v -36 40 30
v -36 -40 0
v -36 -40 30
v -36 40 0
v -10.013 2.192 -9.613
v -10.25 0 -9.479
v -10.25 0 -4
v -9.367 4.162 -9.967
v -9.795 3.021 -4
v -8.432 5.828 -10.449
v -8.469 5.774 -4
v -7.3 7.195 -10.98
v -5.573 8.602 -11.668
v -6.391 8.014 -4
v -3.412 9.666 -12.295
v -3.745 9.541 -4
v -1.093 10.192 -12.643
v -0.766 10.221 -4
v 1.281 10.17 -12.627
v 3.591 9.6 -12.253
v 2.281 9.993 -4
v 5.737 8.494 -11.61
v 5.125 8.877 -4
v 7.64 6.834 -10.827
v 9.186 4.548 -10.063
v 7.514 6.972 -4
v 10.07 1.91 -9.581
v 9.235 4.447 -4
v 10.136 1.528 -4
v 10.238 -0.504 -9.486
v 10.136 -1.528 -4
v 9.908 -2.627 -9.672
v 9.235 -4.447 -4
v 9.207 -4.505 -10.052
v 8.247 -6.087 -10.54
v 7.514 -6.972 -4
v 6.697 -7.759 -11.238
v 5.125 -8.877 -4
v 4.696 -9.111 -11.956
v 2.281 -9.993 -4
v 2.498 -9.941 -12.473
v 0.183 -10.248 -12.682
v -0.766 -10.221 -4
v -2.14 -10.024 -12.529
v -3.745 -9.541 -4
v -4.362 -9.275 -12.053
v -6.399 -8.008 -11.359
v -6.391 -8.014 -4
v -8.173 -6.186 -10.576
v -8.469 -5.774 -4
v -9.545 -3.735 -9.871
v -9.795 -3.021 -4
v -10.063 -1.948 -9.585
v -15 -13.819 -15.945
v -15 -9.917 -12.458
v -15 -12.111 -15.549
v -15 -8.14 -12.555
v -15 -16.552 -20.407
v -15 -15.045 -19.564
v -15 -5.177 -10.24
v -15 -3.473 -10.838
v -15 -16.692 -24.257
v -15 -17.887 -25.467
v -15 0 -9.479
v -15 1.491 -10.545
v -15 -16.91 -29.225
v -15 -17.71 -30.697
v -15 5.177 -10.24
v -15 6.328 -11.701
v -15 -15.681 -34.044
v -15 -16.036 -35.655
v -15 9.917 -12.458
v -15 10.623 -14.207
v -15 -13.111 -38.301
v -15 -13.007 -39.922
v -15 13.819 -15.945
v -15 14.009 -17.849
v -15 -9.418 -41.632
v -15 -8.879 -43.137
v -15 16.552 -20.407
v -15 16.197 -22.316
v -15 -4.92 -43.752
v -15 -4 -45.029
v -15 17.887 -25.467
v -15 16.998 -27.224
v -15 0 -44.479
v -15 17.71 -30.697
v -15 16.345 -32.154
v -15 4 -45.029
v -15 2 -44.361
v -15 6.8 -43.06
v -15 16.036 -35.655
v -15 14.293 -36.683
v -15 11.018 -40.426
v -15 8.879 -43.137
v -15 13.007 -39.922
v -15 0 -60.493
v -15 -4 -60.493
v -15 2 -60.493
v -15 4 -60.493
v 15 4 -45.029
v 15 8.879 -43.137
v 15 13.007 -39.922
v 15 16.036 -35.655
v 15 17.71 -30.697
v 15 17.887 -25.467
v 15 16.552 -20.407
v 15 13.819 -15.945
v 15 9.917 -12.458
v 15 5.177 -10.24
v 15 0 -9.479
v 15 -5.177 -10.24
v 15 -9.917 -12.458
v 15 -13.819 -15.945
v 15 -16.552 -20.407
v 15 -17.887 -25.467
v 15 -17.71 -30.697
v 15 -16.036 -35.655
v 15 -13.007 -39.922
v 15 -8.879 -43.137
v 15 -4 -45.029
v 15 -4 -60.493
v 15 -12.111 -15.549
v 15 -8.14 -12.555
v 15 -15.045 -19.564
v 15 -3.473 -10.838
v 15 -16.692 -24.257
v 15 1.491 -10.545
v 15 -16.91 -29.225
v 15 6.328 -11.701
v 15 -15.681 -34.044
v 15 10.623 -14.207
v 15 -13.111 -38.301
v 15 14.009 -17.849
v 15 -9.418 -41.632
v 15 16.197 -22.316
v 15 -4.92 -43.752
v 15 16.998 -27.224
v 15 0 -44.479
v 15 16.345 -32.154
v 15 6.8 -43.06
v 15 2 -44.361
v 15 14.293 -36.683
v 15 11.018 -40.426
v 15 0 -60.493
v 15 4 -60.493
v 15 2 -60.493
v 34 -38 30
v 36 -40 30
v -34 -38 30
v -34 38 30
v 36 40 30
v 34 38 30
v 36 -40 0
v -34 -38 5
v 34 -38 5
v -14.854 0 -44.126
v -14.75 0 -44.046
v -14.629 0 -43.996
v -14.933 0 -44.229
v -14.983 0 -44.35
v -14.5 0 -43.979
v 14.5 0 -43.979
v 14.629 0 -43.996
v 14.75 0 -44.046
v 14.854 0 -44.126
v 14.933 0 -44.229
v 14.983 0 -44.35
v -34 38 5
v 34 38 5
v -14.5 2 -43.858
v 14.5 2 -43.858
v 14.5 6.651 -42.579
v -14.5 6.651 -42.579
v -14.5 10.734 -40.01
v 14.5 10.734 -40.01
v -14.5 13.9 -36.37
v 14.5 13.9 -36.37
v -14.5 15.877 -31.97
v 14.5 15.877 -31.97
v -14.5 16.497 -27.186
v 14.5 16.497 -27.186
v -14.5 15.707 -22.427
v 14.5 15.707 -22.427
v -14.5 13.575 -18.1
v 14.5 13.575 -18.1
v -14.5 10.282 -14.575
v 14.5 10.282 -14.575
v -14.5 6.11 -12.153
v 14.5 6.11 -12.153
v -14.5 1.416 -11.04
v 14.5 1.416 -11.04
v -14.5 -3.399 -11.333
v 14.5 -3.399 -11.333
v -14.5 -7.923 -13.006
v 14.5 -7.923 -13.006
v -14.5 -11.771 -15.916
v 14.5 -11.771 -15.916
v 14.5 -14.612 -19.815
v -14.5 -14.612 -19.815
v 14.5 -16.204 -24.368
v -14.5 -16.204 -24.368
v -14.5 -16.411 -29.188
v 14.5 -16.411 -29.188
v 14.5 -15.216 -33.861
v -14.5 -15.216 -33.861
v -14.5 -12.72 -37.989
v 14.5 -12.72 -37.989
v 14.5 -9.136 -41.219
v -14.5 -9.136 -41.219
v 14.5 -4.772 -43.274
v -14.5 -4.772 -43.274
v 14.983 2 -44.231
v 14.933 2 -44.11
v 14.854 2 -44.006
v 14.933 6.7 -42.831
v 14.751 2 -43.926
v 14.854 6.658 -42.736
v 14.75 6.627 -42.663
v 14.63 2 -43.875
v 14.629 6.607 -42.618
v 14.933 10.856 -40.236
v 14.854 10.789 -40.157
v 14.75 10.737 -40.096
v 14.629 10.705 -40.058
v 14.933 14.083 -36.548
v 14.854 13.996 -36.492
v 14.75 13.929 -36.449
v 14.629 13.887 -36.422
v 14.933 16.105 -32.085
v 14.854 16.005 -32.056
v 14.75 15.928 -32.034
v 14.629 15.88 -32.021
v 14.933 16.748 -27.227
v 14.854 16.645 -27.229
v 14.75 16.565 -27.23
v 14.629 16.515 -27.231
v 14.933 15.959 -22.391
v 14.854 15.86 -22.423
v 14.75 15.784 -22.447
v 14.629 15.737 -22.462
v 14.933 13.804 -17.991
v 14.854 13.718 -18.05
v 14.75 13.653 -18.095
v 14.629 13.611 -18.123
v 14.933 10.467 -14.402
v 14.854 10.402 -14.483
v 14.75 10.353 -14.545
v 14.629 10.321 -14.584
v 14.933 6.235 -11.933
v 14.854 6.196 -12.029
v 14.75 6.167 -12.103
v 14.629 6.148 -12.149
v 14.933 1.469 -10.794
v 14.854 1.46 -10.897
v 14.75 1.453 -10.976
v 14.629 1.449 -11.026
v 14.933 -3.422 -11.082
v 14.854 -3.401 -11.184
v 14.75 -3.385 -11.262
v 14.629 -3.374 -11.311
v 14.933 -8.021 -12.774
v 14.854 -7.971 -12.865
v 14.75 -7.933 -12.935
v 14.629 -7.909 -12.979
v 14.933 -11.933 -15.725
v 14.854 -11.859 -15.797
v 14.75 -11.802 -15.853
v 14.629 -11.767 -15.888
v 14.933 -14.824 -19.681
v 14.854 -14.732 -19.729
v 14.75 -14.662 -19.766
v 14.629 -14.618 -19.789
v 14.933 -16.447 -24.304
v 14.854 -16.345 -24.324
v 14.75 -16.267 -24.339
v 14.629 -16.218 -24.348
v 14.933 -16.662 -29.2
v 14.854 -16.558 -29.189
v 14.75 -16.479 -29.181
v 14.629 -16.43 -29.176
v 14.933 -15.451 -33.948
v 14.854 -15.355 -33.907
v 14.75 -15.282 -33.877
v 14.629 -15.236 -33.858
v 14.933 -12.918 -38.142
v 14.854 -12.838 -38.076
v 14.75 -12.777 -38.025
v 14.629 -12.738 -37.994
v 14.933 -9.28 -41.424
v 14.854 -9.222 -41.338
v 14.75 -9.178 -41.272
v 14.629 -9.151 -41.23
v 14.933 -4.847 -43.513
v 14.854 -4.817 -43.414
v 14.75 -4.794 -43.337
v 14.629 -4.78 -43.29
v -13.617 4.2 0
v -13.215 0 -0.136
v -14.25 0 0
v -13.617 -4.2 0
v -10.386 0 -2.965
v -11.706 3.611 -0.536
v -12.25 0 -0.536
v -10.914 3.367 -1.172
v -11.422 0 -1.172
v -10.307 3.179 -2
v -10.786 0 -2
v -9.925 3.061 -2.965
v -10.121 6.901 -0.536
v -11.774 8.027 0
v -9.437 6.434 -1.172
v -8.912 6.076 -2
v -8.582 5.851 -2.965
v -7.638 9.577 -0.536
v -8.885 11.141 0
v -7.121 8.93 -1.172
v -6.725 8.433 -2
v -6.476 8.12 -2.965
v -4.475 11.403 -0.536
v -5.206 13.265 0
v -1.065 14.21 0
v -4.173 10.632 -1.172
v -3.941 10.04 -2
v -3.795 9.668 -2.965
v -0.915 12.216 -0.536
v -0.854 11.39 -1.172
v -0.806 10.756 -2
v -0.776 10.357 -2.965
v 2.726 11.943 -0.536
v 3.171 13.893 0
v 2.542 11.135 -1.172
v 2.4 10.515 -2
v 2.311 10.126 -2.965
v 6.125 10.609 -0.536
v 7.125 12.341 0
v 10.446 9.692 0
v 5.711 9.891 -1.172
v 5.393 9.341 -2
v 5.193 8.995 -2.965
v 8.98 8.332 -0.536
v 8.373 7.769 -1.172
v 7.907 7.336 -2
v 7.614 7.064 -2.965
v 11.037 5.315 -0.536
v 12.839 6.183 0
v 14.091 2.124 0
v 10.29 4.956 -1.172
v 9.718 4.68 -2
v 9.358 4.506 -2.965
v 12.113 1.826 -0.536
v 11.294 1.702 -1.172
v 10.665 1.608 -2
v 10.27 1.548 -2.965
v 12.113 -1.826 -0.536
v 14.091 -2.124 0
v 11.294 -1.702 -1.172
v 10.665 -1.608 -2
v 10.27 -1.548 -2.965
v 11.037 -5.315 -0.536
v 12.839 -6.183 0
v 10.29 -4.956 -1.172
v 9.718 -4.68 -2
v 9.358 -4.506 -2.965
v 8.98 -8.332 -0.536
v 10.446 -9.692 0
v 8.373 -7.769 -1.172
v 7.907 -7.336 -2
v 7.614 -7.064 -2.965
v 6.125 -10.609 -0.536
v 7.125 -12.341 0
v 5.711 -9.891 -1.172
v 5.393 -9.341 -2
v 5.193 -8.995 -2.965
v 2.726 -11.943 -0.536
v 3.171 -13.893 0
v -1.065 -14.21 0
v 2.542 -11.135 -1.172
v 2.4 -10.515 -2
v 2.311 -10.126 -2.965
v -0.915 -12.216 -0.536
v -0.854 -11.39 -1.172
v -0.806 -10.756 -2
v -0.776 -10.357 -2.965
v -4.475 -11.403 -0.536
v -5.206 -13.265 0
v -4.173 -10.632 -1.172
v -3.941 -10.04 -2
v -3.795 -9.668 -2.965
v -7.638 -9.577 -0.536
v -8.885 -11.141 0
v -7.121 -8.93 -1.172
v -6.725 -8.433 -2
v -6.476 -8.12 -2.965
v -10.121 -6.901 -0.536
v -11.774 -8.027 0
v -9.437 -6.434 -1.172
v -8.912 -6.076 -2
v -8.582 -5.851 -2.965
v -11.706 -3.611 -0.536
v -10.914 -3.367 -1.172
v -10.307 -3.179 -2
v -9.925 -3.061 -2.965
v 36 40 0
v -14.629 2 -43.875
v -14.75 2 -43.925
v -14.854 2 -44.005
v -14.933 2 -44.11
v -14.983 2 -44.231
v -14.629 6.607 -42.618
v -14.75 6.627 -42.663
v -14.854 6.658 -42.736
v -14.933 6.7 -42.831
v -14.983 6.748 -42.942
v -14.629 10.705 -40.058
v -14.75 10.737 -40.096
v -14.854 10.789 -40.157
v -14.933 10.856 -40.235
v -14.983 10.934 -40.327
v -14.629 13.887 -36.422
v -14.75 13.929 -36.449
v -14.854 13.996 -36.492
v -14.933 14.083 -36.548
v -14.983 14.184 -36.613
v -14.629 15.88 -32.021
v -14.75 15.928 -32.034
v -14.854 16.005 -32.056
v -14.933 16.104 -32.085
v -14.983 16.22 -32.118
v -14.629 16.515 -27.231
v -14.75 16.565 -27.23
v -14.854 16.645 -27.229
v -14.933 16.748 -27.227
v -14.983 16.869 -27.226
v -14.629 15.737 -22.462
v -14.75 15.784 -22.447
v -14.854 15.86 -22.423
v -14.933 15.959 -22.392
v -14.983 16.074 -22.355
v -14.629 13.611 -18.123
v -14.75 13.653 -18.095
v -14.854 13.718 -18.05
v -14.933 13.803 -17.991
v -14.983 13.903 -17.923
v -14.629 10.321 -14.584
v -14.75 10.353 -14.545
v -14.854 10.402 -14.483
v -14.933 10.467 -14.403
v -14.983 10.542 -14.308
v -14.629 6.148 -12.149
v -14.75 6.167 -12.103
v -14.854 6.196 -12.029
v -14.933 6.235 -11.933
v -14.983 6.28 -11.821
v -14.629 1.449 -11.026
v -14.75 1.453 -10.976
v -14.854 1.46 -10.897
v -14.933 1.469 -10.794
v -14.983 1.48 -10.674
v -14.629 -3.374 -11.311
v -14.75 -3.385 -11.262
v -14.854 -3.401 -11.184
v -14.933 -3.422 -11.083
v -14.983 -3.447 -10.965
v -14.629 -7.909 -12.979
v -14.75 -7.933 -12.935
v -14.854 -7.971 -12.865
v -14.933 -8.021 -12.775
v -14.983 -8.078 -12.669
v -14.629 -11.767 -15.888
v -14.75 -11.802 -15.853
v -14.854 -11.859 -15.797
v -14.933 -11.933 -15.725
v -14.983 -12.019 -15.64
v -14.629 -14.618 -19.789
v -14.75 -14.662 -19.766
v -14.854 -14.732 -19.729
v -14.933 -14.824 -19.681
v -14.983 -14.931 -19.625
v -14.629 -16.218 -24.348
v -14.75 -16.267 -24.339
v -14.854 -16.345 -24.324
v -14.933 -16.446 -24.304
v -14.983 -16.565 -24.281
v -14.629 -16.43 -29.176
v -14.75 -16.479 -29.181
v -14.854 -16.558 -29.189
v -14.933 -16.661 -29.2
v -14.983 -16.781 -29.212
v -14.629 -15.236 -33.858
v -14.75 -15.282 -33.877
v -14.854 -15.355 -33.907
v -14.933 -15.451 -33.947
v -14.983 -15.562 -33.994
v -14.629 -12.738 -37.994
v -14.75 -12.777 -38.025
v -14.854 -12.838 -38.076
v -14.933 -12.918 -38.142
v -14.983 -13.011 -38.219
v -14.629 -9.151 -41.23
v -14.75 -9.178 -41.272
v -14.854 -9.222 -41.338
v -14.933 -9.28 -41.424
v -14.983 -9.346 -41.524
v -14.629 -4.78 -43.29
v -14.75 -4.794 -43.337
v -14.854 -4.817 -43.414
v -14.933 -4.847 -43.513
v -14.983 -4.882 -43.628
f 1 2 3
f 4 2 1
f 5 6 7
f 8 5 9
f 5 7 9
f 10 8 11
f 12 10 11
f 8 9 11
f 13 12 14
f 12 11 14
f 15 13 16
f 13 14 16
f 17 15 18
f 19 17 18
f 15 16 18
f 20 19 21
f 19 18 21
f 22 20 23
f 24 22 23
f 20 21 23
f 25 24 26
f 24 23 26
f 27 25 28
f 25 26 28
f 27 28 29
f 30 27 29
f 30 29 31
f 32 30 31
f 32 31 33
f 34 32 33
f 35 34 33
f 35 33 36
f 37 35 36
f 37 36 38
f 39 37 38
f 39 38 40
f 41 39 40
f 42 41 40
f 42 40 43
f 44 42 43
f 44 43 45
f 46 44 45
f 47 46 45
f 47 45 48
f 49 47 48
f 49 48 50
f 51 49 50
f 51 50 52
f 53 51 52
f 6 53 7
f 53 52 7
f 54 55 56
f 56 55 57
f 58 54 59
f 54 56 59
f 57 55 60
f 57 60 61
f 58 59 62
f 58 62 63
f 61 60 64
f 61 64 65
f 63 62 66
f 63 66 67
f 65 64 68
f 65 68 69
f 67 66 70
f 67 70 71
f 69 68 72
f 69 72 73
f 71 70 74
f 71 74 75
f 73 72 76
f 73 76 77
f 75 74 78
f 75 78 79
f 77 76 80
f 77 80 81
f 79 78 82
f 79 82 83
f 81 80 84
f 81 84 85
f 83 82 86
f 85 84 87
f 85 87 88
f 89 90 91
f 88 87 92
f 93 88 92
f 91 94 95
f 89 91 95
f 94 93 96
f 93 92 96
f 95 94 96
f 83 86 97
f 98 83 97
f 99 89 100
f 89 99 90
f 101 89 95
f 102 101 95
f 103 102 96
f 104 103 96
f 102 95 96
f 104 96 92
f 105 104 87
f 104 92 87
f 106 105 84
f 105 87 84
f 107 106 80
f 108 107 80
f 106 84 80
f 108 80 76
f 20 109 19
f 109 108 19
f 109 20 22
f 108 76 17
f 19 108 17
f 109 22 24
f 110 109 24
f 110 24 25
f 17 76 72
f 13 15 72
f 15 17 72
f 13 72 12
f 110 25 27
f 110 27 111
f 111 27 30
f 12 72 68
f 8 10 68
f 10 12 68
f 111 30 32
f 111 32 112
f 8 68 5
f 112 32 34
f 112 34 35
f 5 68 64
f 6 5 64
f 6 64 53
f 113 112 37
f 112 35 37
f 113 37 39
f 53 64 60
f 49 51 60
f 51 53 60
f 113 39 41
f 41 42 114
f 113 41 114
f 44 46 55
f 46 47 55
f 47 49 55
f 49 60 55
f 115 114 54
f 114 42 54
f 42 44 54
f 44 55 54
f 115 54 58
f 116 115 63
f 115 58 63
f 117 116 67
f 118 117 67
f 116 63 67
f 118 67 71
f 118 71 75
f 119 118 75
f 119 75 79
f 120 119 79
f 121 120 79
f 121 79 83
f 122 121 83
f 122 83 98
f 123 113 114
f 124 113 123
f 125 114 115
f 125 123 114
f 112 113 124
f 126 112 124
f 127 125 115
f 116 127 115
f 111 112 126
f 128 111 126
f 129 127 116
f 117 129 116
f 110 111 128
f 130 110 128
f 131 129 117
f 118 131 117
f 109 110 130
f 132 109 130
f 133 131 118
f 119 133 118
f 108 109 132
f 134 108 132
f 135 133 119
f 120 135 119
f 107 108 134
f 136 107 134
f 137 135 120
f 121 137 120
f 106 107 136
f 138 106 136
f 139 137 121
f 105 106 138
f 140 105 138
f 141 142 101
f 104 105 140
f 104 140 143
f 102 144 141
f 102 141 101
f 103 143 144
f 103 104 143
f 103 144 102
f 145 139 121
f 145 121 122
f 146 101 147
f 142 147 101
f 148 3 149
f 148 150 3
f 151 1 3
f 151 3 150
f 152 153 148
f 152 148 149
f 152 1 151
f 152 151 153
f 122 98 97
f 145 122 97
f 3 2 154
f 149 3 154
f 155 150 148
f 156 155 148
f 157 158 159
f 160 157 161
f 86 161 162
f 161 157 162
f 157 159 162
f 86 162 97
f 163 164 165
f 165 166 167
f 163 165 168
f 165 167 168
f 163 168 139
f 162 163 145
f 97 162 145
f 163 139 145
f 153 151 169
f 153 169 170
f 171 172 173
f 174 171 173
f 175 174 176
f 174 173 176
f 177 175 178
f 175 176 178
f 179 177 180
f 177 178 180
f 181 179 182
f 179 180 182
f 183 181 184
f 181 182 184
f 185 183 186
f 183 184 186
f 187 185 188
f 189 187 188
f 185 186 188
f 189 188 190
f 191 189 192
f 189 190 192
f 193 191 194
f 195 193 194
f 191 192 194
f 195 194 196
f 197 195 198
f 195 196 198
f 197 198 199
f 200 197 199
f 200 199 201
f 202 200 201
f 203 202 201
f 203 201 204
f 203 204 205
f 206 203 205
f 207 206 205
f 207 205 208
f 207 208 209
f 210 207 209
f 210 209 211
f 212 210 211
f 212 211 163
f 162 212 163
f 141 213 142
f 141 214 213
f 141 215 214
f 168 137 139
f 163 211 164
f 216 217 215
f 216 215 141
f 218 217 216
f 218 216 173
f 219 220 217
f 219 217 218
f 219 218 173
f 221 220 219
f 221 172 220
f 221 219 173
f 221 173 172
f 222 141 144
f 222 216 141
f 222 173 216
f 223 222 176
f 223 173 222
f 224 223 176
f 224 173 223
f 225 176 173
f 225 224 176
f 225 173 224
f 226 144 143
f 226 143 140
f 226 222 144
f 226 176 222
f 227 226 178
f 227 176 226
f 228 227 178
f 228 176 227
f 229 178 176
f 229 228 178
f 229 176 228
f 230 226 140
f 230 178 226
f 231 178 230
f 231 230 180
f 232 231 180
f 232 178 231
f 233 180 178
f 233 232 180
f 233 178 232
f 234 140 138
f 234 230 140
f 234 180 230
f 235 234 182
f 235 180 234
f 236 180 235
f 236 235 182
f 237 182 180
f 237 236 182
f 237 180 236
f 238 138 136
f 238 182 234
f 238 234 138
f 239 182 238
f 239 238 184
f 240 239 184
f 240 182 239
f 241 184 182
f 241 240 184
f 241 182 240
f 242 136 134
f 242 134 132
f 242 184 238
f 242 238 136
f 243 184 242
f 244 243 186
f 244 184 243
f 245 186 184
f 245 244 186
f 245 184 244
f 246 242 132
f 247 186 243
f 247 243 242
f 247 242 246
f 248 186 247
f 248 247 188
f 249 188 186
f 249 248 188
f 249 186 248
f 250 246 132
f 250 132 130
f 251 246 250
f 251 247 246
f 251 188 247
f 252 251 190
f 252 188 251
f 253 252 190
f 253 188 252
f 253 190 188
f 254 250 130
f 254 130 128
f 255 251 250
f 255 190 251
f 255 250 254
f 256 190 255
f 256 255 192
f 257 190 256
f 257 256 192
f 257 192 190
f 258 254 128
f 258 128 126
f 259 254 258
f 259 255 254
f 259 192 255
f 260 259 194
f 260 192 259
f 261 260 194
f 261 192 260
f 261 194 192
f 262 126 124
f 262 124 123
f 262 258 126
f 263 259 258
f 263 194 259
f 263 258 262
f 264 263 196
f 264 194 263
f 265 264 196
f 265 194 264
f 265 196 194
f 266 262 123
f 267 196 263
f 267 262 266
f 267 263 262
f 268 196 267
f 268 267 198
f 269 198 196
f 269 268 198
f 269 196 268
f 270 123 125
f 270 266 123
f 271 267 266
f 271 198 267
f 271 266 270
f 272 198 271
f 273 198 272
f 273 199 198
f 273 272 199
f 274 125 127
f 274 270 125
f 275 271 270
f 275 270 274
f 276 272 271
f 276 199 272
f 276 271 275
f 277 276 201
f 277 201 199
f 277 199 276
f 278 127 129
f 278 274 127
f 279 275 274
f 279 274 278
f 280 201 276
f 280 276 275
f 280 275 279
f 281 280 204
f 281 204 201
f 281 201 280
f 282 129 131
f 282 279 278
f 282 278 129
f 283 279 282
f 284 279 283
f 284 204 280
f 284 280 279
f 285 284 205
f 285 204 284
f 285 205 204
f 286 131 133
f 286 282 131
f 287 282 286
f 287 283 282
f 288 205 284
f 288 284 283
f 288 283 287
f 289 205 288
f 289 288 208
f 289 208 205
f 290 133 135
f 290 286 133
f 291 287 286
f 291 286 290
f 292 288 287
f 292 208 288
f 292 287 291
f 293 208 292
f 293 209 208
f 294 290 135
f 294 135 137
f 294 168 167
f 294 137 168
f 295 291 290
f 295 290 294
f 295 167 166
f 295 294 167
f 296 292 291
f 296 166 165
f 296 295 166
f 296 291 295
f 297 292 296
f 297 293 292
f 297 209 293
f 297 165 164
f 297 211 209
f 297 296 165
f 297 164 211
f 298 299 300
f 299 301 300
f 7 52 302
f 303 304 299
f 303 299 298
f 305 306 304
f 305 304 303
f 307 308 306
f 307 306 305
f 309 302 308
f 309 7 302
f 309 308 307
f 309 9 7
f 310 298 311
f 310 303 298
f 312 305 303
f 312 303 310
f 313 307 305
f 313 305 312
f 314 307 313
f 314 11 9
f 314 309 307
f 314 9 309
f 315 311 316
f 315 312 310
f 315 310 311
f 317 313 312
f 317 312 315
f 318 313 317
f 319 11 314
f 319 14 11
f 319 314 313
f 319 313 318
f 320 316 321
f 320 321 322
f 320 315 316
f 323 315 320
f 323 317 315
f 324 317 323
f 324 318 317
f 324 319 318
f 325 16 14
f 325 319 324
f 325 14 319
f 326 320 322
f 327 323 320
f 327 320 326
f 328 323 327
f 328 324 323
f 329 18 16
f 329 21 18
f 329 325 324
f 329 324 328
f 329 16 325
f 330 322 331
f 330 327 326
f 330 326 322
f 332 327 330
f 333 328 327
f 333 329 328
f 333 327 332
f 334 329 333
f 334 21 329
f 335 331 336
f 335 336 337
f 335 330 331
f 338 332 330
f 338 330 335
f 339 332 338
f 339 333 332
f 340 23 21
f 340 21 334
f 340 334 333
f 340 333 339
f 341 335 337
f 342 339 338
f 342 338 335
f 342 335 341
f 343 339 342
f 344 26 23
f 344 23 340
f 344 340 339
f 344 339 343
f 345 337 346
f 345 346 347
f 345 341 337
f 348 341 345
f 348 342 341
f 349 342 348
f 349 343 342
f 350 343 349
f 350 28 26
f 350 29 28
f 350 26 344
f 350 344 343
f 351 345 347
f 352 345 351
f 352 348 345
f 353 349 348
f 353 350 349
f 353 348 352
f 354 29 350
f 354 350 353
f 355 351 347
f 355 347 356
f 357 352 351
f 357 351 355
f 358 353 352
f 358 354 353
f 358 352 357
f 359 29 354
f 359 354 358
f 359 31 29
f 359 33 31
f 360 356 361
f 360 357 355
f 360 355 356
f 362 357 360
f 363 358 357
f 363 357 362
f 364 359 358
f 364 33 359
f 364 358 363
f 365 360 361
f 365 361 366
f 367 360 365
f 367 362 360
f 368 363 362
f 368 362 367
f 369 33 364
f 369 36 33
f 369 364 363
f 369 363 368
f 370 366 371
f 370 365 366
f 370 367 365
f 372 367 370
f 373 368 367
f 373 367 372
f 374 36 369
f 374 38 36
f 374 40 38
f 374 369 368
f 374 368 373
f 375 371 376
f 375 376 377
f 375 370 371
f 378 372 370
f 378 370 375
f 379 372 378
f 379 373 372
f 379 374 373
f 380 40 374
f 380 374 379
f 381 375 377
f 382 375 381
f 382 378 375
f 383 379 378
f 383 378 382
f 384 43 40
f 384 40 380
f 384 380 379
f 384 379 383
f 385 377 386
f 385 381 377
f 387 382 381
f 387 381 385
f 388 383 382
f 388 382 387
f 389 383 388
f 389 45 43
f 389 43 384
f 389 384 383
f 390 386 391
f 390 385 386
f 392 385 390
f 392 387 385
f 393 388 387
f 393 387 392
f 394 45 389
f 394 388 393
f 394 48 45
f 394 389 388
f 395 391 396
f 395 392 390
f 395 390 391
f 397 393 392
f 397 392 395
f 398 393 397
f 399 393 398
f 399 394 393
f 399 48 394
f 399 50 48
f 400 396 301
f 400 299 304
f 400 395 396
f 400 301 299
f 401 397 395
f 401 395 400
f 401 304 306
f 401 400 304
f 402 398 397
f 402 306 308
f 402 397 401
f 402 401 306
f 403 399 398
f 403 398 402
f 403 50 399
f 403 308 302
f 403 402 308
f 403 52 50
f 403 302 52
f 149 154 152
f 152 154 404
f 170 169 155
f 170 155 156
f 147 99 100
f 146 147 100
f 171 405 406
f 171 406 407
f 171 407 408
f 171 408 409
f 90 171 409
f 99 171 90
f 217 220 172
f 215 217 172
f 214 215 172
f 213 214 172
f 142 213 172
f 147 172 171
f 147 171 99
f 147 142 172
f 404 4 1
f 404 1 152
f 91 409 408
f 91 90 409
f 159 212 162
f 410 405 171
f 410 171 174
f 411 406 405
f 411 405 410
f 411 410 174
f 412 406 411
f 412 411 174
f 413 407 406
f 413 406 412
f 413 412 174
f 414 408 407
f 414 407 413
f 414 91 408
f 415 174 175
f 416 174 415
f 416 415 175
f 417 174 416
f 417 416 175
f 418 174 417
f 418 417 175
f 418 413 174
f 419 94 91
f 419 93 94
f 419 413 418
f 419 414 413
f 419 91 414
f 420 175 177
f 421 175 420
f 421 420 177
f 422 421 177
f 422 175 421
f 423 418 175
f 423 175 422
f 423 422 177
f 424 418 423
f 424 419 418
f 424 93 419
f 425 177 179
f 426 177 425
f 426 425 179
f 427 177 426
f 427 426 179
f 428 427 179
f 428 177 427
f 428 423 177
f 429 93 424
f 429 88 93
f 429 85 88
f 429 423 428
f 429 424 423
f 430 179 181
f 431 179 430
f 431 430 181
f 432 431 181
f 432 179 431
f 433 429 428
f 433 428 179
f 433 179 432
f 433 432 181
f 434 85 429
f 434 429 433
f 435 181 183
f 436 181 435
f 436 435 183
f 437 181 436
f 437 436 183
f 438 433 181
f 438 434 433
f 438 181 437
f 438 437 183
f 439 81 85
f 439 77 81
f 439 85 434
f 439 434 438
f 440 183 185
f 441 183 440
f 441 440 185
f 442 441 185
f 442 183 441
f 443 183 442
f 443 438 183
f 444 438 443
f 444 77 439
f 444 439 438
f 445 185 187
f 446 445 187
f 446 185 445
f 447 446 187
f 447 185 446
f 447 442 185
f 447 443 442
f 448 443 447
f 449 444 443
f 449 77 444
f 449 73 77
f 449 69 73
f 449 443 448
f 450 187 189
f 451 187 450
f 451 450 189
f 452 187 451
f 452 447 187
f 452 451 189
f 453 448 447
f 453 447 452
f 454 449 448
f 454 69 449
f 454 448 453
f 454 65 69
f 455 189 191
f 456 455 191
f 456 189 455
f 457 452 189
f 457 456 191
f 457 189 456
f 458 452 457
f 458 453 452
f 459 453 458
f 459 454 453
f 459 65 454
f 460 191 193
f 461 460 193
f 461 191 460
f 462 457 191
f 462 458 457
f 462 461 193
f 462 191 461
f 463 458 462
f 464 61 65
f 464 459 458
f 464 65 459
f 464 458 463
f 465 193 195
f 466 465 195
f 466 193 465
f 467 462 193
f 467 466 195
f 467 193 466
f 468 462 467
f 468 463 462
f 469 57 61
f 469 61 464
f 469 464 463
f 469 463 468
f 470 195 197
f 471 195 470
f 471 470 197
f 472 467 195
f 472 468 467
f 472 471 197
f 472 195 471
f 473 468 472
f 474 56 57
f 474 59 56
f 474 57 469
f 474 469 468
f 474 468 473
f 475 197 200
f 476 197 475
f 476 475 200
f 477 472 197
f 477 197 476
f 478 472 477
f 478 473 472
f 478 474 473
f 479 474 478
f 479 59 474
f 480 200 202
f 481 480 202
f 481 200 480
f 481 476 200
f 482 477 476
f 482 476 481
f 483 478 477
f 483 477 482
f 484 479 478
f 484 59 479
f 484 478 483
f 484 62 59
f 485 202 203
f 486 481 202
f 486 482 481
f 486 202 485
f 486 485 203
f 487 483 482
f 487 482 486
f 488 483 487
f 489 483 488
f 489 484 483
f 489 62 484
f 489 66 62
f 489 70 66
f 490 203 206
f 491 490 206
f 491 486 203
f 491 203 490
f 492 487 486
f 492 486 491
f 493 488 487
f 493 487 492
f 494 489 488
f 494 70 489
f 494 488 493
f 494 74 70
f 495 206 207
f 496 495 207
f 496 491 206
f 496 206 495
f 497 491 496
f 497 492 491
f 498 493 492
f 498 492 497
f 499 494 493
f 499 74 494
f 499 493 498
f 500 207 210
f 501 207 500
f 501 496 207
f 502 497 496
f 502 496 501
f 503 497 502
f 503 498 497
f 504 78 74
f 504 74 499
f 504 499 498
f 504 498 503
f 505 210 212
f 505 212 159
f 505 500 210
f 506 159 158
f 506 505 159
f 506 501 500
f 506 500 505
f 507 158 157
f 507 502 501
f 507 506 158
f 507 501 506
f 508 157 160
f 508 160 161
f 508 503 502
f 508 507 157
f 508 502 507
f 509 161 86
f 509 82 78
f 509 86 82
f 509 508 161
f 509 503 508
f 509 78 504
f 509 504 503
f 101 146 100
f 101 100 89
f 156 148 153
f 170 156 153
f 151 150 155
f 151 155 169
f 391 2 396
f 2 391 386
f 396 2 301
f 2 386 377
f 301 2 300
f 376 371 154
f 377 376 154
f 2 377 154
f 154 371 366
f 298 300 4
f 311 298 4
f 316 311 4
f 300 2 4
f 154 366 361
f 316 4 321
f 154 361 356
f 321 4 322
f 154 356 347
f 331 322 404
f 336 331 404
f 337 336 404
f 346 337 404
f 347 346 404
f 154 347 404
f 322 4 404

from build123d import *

# Parameters (mm, degrees)
ESBO_O1_W                     = 72
ESBO_O1_H                     = 80
RESSALTO_EXTRUS_O1_DEPTH      = 30
ESBO_O3_W                     = 68
ESBO_O3_H                     = 76
CORTE_EXTRUS_O1_DEPTH         = 25
ESBO_O7_R                     = 10.25
RESSALTO_EXTRUS_O3_DEPTH      = 15
FILETE1_R                     = 4
RESSALTO_EXTRUS_O4_DEPTH      = 15
RESSALTO_EXTRUS_O4_DEPTH_BACK = 15
ESBO_O9_R                     = 18
ESBO_O10_R                    = 16.5
CORTE_EXTRUS_O2_DEPTH         = 40
RESSALTO_EXTRUS_O5_DEPTH      = 15
RESSALTO_EXTRUS_O5_DEPTH_BACK = 15
ESBO_O12_W                    = 17
ESBO_O12_H                    = 2
CORTE_EXTRUS_O3_DEPTH         = 40
FILETE2_R                     = 0.5
FILETE3_R                     = 0.5


with BuildPart() as part:
    # Esboço1 → Ressalto-extrusão1 (new body)
    with BuildSketch(Plane.XY):
        Rectangle(ESBO_O1_W, ESBO_O1_H)
    extrude(amount=RESSALTO_EXTRUS_O1_DEPTH)

    # Esboço3 → Corte-extrusão1 (cut)
    with BuildSketch(Plane.XY.offset(30)):
        Rectangle(ESBO_O3_W, ESBO_O3_H)
    extrude(amount=-CORTE_EXTRUS_O1_DEPTH, mode=Mode.SUBTRACT)

    # Esboço7 → Ressalto-extrusão3 (add)
    with BuildSketch(Plane(origin=(0, 0, 0), x_dir=(-1, 0, 0), z_dir=(0, 0, -1))):
        Circle(ESBO_O7_R)
    extrude(amount=RESSALTO_EXTRUS_O3_DEPTH)

    # Filete1
    filete1_edges = [part.edges().sort_by_distance(p)[0] for p in [
        (10.25, 0, 0),
    ]]
    fillet(filete1_edges, radius=FILETE1_R)

    # Esboço9 → Ressalto-extrusão4 (add, two sides: drawn at the far end of the back side and taken through both)
    with BuildSketch(Plane(origin=(0, 0, 0), x_dir=(0, 0, -1), z_dir=(1, 0, 0)).offset(-RESSALTO_EXTRUS_O4_DEPTH_BACK)):
        with Locations((27.479364999, 0)):
            Circle(ESBO_O9_R)
    extrude(amount=RESSALTO_EXTRUS_O4_DEPTH + RESSALTO_EXTRUS_O4_DEPTH_BACK)

    # Esboço10 → Corte-extrusão2 (cut)
    with BuildSketch(Plane(origin=(15, 0, 0), x_dir=(0, 0, -1), z_dir=(1, 0, 0))):
        with Locations((27.479364999, 0)):
            Circle(ESBO_O10_R)
    extrude(amount=-CORTE_EXTRUS_O2_DEPTH, mode=Mode.SUBTRACT)

    # Esboço11 → Ressalto-extrusão5 (add, two sides: drawn at the far end of the back side and taken through both)
    with BuildSketch(Plane(origin=(0, 0, 0), x_dir=(0, 0, -1), z_dir=(1, 0, 0)).offset(-RESSALTO_EXTRUS_O5_DEPTH_BACK)):
        Polygon((60.492568737, 0), (60.492568737, 4), (45.029293774, 4), (45.029293774, -4), (60.492568737, -4), align=None)
    extrude(amount=RESSALTO_EXTRUS_O5_DEPTH + RESSALTO_EXTRUS_O5_DEPTH_BACK)

    # Esboço12 → Corte-extrusão3 (cut)
    with BuildSketch(Plane(origin=(15, 0, 0), x_dir=(0, 0, -1), z_dir=(1, 0, 0))):
        with Locations((51.992568737, 1)):
            Rectangle(ESBO_O12_W, ESBO_O12_H)
    extrude(amount=-CORTE_EXTRUS_O3_DEPTH, mode=Mode.SUBTRACT)

    # Filete2
    filete2_edges = [part.edges().sort_by_distance(p)[0] for p in [
        (15, -1.001848456, -11.009808245),
    ]]
    fillet(filete2_edges, radius=FILETE2_R)

    # Filete3
    filete3_edges = [part.edges().sort_by_distance(p)[0] for p in [
        (-15, -1.001848456, -11.009808245),
    ]]
    fillet(filete3_edges, radius=FILETE3_R)


solid = part.part
